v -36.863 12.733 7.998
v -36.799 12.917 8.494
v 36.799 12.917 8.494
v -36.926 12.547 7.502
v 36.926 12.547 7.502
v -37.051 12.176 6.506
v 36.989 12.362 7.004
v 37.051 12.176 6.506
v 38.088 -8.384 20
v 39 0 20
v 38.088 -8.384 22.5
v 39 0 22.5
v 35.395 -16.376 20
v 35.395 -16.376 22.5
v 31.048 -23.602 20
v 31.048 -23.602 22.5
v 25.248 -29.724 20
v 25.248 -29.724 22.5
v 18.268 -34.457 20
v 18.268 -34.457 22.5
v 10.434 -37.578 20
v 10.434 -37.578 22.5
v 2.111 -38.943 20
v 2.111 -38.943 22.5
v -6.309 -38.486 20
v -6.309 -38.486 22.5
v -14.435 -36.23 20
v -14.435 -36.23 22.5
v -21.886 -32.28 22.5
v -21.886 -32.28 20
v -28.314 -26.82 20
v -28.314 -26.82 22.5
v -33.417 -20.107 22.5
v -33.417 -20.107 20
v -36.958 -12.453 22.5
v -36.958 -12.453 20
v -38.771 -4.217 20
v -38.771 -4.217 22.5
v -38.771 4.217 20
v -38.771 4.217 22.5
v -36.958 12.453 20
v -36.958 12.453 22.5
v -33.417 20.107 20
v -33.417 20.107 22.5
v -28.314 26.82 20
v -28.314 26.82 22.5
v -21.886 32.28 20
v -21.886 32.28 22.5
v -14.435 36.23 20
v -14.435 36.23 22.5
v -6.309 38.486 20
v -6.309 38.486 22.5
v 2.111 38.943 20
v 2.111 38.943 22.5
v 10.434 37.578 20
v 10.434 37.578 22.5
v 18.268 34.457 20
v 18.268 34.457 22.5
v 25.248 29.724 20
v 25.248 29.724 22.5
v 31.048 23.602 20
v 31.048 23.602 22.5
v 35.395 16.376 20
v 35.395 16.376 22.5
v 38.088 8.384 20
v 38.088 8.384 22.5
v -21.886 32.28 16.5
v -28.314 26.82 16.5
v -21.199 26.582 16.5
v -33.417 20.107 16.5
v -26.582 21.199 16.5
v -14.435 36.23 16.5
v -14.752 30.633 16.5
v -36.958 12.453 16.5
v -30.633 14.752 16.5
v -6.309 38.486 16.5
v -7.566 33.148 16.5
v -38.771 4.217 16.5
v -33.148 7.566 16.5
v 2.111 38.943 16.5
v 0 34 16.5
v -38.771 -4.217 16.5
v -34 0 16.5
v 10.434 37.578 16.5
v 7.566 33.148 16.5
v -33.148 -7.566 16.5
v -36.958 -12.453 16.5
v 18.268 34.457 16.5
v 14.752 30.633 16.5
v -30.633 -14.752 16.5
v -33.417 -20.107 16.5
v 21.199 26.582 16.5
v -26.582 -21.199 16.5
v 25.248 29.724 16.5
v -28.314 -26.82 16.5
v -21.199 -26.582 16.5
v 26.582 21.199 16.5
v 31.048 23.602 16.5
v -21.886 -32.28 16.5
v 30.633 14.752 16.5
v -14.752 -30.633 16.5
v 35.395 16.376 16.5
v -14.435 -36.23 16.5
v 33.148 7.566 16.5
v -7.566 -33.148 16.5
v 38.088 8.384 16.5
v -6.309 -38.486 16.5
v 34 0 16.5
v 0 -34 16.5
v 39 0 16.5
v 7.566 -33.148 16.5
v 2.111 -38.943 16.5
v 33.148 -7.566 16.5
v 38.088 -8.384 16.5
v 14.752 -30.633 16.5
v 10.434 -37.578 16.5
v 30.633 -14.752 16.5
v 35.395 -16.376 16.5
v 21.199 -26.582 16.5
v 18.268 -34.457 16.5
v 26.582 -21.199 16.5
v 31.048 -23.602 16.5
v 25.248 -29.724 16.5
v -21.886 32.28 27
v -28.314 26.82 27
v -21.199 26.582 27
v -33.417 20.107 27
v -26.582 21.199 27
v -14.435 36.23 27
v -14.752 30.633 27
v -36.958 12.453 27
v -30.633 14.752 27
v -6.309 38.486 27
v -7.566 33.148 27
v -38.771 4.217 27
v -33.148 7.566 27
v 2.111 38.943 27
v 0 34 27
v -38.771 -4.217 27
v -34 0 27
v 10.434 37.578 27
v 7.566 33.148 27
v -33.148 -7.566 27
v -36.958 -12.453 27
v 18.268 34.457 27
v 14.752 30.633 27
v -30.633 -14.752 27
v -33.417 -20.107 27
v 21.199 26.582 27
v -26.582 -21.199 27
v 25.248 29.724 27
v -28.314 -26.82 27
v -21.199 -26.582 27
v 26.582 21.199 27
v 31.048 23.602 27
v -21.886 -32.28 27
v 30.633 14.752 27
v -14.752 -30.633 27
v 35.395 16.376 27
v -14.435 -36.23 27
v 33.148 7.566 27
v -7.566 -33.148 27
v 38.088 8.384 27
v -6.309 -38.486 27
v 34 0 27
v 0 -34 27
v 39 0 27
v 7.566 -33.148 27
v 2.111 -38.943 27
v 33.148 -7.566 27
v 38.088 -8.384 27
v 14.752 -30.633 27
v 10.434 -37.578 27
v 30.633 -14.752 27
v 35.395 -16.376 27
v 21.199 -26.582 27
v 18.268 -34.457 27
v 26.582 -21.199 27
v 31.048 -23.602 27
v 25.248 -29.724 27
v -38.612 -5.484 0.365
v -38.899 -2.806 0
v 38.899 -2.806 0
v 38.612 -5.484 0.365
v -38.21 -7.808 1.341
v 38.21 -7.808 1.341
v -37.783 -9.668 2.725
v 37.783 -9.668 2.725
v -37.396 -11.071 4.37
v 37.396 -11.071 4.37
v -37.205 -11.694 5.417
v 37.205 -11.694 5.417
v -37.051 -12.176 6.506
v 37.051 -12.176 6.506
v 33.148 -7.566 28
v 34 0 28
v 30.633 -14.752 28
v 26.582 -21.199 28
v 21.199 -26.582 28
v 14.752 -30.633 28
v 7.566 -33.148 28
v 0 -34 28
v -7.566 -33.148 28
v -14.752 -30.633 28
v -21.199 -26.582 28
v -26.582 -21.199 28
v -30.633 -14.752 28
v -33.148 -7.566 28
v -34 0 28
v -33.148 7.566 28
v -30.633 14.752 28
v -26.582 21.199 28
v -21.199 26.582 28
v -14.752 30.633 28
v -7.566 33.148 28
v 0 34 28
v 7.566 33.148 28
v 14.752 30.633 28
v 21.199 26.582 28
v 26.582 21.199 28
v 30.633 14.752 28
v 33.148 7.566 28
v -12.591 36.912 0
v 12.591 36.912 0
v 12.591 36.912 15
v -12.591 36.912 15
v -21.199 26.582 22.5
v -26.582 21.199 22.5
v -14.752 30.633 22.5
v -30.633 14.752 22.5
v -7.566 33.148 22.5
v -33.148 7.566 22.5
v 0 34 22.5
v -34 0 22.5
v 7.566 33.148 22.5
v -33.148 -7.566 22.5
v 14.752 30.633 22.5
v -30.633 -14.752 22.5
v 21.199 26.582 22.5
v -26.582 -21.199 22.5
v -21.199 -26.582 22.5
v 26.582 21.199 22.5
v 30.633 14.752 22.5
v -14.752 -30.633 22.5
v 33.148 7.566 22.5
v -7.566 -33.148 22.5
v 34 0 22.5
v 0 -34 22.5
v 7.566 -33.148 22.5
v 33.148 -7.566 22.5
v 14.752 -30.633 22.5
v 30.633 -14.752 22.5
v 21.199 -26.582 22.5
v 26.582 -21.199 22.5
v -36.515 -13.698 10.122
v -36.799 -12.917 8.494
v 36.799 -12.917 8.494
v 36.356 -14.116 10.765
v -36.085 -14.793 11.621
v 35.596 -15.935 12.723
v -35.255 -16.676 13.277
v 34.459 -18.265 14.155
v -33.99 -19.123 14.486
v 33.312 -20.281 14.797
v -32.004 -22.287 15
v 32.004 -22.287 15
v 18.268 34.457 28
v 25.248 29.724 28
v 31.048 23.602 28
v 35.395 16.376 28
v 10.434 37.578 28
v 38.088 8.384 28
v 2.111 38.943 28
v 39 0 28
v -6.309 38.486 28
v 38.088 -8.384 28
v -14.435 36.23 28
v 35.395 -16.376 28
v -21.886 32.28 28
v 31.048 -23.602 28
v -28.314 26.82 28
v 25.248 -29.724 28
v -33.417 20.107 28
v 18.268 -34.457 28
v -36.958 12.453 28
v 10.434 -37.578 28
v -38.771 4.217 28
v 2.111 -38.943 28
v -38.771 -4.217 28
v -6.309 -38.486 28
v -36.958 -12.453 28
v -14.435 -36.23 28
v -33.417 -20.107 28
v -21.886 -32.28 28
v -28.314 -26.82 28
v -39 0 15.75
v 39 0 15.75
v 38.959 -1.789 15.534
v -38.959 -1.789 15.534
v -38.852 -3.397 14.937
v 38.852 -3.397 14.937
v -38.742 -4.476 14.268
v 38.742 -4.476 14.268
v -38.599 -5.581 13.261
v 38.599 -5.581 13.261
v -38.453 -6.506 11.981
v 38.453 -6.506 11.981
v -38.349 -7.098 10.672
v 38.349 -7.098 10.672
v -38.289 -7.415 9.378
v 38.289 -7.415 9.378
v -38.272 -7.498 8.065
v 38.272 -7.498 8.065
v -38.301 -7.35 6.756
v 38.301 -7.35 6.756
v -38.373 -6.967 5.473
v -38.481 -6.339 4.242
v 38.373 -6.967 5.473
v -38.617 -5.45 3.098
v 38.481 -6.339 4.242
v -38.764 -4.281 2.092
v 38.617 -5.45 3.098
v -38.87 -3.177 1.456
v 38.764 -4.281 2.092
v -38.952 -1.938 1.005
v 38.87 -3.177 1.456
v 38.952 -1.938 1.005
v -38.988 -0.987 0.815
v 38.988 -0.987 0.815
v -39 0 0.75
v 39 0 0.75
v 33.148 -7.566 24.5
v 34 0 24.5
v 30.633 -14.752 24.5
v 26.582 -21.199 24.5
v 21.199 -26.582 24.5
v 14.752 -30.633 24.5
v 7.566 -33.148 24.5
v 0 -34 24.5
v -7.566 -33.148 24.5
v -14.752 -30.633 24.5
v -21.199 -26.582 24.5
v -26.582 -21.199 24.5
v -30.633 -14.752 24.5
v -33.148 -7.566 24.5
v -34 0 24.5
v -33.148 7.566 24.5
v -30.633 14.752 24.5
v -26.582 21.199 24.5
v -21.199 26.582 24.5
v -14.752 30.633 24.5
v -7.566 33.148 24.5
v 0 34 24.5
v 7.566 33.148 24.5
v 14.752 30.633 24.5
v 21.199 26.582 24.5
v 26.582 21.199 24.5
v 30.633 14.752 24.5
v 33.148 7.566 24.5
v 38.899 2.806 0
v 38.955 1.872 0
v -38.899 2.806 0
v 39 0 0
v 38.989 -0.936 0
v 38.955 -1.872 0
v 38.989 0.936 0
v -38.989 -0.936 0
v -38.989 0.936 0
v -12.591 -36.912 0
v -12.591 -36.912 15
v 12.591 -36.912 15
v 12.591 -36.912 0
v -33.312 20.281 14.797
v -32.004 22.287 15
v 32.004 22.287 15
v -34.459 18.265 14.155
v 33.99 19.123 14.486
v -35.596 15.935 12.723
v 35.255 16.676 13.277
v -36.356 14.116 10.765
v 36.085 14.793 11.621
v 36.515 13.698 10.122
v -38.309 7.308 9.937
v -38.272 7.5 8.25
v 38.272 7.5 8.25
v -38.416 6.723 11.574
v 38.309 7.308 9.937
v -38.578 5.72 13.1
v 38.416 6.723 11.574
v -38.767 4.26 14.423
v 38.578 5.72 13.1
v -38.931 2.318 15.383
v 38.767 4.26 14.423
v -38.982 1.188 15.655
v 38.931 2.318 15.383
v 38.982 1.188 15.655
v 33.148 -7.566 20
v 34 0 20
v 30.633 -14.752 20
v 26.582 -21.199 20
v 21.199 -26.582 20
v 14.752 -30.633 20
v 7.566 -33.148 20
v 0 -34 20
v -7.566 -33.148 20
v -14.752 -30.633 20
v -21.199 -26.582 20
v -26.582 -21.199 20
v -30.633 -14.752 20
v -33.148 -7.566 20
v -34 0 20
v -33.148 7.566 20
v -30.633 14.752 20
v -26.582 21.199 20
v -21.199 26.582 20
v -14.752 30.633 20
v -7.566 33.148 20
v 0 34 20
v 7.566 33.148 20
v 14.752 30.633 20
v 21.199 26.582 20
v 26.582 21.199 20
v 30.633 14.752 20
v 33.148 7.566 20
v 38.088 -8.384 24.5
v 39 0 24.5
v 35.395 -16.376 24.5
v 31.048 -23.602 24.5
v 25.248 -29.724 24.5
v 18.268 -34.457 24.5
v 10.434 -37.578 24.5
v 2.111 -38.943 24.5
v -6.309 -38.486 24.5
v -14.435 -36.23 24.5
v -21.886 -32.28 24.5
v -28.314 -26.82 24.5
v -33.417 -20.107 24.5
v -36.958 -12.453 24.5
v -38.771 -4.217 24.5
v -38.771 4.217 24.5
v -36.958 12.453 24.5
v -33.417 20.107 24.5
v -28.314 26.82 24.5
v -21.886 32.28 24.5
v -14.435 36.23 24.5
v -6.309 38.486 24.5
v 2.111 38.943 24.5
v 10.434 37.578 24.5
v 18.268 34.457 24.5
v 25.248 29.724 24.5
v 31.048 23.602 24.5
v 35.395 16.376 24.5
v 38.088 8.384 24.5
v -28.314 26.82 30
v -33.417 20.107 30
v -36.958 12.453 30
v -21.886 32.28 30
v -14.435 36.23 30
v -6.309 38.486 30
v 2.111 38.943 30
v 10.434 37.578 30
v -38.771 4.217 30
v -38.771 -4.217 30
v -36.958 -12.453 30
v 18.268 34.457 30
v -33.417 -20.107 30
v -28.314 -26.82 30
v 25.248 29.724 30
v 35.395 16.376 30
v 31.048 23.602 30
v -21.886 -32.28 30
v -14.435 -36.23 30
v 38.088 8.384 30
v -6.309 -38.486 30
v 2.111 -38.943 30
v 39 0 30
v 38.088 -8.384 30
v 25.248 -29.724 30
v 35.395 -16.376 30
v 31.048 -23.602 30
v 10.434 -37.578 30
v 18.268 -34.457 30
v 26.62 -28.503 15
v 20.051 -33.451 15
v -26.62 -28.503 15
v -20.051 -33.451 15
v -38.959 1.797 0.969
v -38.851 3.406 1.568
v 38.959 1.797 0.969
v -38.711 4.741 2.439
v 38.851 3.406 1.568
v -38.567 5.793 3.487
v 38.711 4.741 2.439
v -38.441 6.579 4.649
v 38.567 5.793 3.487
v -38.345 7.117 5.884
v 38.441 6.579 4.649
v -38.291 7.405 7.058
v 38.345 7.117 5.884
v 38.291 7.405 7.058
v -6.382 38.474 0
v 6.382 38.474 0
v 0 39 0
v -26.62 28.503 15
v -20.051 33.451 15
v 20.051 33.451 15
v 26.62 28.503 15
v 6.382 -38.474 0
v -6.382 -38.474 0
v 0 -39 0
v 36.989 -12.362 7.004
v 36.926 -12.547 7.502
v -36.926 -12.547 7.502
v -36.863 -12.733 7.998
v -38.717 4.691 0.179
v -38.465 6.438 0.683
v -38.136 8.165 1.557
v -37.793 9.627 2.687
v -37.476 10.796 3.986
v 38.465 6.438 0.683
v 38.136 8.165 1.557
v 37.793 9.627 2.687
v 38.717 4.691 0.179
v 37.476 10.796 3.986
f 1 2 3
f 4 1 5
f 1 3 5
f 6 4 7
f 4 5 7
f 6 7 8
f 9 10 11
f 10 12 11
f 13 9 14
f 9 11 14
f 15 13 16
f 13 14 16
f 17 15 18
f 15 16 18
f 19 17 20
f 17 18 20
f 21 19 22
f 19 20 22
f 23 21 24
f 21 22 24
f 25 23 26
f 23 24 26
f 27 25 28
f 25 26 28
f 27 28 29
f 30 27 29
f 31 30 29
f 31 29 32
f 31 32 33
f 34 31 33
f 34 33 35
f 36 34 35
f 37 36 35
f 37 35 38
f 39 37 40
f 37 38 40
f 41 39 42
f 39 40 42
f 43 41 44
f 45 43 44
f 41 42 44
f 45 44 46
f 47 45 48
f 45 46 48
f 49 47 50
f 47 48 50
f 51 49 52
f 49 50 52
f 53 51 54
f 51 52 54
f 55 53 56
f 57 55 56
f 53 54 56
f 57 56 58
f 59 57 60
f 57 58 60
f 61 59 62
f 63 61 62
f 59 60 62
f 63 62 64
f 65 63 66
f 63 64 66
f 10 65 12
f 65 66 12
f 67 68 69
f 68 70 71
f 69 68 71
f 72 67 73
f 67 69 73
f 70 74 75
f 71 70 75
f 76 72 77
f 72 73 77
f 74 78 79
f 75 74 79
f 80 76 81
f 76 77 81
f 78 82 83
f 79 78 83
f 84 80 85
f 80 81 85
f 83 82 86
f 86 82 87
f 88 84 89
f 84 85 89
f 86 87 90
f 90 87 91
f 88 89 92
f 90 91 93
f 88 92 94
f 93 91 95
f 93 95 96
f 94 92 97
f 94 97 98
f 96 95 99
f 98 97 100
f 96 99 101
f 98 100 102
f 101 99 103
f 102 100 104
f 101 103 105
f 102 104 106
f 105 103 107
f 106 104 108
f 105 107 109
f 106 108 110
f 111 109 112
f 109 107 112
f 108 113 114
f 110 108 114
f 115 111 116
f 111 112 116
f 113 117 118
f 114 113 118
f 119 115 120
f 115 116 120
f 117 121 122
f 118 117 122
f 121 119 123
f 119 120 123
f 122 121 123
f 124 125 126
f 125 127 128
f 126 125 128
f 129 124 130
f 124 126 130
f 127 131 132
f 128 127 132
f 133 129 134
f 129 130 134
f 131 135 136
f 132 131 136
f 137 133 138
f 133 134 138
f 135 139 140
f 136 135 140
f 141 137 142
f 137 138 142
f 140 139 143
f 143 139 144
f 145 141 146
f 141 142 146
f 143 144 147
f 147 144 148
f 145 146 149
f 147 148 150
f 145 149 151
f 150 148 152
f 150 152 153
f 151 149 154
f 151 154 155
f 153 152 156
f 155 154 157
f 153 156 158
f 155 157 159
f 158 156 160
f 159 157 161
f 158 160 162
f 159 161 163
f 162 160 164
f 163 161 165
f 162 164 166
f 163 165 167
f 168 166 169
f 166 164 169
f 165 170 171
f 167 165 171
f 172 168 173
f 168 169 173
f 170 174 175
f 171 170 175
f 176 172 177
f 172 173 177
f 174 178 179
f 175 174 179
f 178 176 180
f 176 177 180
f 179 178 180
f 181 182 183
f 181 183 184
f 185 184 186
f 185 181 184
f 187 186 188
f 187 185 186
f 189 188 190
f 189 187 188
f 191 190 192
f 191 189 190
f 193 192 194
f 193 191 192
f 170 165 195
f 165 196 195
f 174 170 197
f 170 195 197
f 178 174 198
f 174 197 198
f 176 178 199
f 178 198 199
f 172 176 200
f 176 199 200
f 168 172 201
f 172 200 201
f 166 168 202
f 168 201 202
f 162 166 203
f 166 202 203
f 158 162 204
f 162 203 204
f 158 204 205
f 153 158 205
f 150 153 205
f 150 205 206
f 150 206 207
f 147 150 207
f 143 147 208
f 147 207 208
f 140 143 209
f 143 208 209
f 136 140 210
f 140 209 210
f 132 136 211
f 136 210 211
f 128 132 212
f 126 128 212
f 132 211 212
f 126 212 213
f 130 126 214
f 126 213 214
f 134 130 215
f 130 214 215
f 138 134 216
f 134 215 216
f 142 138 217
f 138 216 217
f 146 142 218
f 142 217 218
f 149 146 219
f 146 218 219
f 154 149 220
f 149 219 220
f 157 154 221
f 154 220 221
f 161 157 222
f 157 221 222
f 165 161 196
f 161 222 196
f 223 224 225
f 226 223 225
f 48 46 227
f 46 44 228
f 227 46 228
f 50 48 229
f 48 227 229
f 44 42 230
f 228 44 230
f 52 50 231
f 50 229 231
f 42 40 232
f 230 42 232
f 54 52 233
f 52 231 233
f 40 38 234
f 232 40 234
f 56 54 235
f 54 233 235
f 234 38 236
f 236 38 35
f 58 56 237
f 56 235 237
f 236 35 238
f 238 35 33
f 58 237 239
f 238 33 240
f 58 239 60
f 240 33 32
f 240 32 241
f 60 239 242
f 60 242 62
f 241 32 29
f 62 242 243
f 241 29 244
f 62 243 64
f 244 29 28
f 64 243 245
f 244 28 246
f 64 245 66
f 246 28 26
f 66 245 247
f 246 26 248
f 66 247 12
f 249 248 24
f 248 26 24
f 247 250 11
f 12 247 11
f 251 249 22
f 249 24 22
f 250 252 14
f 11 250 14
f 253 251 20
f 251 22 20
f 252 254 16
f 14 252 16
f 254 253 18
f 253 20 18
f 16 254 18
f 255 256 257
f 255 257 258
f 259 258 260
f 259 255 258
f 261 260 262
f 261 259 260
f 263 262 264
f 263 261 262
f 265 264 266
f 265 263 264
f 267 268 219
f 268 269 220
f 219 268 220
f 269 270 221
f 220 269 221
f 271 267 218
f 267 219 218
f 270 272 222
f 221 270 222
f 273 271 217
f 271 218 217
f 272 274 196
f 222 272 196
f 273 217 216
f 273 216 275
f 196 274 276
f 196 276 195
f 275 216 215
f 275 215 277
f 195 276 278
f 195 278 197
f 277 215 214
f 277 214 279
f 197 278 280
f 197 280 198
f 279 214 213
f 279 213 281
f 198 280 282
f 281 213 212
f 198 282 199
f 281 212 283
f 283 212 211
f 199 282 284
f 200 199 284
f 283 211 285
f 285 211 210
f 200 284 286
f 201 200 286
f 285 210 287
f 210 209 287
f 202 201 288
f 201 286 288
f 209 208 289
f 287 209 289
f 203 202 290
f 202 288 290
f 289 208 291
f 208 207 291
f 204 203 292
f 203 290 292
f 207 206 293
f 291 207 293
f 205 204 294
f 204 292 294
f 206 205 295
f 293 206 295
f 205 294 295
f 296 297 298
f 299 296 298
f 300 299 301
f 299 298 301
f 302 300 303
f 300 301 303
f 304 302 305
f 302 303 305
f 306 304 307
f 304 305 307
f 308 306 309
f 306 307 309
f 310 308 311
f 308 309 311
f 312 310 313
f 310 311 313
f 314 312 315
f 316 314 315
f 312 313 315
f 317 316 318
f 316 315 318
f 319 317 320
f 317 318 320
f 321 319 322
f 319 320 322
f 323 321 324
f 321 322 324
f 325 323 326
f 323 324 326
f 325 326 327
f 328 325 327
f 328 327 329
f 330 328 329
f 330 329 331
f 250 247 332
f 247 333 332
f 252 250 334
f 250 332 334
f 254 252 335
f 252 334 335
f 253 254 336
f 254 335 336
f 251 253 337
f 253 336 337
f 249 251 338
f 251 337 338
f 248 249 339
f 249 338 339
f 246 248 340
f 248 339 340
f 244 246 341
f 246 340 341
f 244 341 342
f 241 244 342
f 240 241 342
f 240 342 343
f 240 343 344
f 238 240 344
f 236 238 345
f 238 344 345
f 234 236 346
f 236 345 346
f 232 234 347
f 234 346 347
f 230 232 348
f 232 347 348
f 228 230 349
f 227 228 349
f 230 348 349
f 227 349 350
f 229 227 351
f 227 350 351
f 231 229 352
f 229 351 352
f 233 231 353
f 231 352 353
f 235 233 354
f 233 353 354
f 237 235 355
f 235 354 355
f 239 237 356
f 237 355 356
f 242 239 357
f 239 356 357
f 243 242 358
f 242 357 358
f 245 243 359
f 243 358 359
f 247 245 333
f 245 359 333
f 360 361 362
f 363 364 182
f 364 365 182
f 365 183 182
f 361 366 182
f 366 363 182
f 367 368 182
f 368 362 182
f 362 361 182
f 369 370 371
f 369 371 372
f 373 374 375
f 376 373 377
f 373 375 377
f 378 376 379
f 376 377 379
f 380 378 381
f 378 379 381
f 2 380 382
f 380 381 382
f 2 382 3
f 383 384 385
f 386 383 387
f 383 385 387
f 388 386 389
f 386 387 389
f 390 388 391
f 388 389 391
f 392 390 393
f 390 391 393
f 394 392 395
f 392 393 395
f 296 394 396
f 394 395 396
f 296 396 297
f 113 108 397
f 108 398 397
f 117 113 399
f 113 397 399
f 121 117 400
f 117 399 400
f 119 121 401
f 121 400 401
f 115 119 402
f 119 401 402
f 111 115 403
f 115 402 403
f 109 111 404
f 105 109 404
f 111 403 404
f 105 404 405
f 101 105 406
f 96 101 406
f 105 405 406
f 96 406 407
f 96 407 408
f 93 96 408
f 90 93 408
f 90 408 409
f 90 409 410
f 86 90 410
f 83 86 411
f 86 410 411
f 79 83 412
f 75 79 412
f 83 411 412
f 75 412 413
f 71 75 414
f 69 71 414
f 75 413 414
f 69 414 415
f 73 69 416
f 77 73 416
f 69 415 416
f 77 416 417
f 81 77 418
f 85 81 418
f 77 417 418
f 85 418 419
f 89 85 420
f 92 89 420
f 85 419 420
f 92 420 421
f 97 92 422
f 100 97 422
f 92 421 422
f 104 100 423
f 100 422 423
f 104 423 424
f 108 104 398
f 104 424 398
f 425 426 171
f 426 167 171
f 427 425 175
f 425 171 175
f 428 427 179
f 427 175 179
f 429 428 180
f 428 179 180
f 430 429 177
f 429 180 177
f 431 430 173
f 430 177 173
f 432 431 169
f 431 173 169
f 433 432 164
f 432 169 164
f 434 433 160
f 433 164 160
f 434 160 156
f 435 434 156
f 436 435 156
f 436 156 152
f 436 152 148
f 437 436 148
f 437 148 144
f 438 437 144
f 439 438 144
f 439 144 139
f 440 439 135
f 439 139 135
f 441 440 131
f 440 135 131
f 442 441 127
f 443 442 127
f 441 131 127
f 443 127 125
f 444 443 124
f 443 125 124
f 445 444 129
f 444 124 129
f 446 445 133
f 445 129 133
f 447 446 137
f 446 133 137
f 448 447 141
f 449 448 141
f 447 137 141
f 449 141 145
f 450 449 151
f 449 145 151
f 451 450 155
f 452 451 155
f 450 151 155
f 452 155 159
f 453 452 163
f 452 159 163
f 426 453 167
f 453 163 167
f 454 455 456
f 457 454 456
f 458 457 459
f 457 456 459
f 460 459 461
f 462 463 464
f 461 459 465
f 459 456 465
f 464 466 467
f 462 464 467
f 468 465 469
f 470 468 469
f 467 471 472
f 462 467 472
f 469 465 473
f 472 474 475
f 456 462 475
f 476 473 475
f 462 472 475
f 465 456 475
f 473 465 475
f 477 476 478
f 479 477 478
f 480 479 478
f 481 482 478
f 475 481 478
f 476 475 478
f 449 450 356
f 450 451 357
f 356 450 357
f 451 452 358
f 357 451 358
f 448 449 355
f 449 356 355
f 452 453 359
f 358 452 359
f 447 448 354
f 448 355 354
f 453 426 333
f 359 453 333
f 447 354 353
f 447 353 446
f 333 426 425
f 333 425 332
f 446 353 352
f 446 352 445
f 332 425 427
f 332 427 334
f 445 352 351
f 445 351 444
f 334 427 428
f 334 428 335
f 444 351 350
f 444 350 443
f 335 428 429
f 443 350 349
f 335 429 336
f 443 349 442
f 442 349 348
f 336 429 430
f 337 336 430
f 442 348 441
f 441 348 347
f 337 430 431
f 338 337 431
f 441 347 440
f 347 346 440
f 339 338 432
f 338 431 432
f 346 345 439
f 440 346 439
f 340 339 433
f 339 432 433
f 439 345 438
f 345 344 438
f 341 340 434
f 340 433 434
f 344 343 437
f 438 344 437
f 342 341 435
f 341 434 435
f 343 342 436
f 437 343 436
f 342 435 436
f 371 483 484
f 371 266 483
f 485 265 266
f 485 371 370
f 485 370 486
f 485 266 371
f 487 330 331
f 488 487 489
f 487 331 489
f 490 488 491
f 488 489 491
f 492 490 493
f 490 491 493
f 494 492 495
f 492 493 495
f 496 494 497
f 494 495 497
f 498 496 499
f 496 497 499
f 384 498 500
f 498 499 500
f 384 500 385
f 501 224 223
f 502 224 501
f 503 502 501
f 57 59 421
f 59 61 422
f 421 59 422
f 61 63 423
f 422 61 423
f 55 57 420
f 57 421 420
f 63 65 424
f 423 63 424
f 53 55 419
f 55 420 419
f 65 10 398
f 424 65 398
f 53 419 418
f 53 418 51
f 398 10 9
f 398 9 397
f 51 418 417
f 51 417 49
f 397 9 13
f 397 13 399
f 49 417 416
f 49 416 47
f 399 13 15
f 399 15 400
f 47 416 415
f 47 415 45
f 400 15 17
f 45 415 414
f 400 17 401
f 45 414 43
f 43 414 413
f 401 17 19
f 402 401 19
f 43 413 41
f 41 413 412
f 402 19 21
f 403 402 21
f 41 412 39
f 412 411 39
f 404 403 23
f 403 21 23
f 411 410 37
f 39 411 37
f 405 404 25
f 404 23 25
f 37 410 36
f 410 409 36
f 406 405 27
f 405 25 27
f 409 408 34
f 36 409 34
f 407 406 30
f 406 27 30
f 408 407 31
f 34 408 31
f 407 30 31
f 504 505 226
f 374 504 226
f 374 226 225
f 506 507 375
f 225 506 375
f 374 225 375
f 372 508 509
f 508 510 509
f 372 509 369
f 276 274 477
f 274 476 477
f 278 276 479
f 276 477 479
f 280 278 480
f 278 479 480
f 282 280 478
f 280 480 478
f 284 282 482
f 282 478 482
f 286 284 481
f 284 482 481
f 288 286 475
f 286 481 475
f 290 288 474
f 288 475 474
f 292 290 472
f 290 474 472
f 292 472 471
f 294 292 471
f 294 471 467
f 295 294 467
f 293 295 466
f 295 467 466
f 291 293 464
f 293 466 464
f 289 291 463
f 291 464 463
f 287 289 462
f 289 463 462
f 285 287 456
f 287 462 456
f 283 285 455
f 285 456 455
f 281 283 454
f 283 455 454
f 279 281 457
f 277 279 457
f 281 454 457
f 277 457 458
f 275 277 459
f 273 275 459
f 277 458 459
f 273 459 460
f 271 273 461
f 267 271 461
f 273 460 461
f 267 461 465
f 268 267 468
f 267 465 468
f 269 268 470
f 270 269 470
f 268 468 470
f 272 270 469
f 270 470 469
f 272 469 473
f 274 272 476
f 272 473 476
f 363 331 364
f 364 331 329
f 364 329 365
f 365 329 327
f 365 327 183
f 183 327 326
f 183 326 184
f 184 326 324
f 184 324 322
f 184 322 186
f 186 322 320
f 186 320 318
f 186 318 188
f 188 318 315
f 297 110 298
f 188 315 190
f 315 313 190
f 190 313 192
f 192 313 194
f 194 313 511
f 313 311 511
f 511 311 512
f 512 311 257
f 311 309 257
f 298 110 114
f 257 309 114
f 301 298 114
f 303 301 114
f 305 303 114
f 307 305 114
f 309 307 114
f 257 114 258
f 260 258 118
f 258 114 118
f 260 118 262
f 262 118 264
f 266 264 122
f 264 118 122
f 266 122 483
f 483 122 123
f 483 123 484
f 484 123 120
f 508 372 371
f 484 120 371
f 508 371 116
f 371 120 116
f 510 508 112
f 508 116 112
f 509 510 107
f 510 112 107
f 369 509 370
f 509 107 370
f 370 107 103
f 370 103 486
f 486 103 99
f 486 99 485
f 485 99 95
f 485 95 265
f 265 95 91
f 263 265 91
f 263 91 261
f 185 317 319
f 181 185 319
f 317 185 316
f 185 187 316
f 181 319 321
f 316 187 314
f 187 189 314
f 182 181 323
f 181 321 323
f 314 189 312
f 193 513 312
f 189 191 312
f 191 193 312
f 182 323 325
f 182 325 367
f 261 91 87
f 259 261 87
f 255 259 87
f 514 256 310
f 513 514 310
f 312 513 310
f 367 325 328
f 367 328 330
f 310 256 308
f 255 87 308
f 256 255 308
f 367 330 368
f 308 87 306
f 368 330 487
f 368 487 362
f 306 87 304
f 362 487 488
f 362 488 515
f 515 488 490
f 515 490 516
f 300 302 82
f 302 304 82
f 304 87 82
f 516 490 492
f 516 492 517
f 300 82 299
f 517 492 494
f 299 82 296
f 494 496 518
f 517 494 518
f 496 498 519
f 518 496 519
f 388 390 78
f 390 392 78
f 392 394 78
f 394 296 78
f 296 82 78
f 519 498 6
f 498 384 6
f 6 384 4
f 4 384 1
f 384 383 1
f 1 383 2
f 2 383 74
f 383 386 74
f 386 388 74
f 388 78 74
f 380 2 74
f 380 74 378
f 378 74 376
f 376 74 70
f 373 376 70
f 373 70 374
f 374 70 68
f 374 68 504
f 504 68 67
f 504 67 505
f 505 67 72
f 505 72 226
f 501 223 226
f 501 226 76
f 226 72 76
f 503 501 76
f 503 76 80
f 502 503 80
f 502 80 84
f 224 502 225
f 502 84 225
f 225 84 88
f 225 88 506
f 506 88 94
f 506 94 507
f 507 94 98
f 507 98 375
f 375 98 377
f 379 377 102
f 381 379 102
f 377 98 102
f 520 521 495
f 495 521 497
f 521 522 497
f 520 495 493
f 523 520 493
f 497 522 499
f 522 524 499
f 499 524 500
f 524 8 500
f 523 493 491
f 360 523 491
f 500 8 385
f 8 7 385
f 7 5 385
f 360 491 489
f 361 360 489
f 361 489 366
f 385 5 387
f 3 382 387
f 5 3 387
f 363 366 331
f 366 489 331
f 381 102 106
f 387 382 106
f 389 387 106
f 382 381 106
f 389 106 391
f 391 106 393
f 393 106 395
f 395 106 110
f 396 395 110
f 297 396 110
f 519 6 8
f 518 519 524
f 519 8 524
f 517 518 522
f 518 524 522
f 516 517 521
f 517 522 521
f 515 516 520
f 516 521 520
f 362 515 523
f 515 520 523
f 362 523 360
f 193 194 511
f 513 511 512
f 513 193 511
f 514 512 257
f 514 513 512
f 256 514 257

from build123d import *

# Parameters (mm, degrees)
F3_DEPTH = 50
F5_DEPTH = 50


with BuildPart() as f1:
    # F0 (on Front) → F1 (revolve)
    with BuildSketch(Plane.XZ):
        Polygon((39, 30), (0, 30), (0, 0), (39, 0), (39, 16.5), (34, 16.5), (34, 20), (39, 20), (39, 22.5), (34, 22.5), (34, 24.5), (39, 24.5), (39, 27), (34, 27), (34, 28), (39, 28), align=None)
    revolve(axis=Axis((0, 0, 15), (0, 0, -1)))

    # F2 (on Right) → F3 (cut, symmetric)
    with BuildSketch(Plane.YZ):
        with BuildLine():
            Line((-36.911555, 0), (-2.806354, 0))
            ThreePointArc((-2.806354, 0), (-8.50987, 1.785993), (-12.176097, 6.506018))
            Line((-12.176097, 6.506018), (-12.91741, 8.493982))
            ThreePointArc((-12.91741, 8.493982), (-16.583638, 13.214007), (-22.287154, 15))
            Line((-22.287154, 15), (-36.911555, 15))
            Line((-36.911555, 15), (-36.911555, 0))
        make_face()
        with BuildLine():
            Line((36.911555, 15), (22.287154, 15))
            ThreePointArc((22.287154, 15), (16.583638, 13.214007), (12.91741, 8.493982))
            Line((12.91741, 8.493982), (12.176097, 6.506018))
            ThreePointArc((12.176097, 6.506018), (8.50987, 1.785993), (2.806354, 0))
            Line((2.806354, 0), (36.911555, 0))
            Line((36.911555, 0), (36.911555, 15))
        make_face()
    extrude(amount=F3_DEPTH, both=True, mode=Mode.SUBTRACT)

    # F4 (on Right) → F5 (cut, symmetric)
    with BuildSketch(Plane.YZ):
        with BuildLine():
            ThreePointArc((0, 15.75), (-7.5, 8.25), (0, 0.75))
            Line((0, 0.75), (0, 8.25))
            Line((0, 8.25), (0, 15.75))
        make_face()
        with BuildLine():
            Line((0, 8.25), (0, 0.75))
            ThreePointArc((0, 0.75), (5.303301, 2.946699), (7.5, 8.25))
            ThreePointArc((7.5, 8.25), (5.303301, 13.553301), (0, 15.75))
            Line((0, 15.75), (0, 8.25))
        make_face()
    extrude(amount=F5_DEPTH, both=True, mode=Mode.SUBTRACT)


solid = f1.part
